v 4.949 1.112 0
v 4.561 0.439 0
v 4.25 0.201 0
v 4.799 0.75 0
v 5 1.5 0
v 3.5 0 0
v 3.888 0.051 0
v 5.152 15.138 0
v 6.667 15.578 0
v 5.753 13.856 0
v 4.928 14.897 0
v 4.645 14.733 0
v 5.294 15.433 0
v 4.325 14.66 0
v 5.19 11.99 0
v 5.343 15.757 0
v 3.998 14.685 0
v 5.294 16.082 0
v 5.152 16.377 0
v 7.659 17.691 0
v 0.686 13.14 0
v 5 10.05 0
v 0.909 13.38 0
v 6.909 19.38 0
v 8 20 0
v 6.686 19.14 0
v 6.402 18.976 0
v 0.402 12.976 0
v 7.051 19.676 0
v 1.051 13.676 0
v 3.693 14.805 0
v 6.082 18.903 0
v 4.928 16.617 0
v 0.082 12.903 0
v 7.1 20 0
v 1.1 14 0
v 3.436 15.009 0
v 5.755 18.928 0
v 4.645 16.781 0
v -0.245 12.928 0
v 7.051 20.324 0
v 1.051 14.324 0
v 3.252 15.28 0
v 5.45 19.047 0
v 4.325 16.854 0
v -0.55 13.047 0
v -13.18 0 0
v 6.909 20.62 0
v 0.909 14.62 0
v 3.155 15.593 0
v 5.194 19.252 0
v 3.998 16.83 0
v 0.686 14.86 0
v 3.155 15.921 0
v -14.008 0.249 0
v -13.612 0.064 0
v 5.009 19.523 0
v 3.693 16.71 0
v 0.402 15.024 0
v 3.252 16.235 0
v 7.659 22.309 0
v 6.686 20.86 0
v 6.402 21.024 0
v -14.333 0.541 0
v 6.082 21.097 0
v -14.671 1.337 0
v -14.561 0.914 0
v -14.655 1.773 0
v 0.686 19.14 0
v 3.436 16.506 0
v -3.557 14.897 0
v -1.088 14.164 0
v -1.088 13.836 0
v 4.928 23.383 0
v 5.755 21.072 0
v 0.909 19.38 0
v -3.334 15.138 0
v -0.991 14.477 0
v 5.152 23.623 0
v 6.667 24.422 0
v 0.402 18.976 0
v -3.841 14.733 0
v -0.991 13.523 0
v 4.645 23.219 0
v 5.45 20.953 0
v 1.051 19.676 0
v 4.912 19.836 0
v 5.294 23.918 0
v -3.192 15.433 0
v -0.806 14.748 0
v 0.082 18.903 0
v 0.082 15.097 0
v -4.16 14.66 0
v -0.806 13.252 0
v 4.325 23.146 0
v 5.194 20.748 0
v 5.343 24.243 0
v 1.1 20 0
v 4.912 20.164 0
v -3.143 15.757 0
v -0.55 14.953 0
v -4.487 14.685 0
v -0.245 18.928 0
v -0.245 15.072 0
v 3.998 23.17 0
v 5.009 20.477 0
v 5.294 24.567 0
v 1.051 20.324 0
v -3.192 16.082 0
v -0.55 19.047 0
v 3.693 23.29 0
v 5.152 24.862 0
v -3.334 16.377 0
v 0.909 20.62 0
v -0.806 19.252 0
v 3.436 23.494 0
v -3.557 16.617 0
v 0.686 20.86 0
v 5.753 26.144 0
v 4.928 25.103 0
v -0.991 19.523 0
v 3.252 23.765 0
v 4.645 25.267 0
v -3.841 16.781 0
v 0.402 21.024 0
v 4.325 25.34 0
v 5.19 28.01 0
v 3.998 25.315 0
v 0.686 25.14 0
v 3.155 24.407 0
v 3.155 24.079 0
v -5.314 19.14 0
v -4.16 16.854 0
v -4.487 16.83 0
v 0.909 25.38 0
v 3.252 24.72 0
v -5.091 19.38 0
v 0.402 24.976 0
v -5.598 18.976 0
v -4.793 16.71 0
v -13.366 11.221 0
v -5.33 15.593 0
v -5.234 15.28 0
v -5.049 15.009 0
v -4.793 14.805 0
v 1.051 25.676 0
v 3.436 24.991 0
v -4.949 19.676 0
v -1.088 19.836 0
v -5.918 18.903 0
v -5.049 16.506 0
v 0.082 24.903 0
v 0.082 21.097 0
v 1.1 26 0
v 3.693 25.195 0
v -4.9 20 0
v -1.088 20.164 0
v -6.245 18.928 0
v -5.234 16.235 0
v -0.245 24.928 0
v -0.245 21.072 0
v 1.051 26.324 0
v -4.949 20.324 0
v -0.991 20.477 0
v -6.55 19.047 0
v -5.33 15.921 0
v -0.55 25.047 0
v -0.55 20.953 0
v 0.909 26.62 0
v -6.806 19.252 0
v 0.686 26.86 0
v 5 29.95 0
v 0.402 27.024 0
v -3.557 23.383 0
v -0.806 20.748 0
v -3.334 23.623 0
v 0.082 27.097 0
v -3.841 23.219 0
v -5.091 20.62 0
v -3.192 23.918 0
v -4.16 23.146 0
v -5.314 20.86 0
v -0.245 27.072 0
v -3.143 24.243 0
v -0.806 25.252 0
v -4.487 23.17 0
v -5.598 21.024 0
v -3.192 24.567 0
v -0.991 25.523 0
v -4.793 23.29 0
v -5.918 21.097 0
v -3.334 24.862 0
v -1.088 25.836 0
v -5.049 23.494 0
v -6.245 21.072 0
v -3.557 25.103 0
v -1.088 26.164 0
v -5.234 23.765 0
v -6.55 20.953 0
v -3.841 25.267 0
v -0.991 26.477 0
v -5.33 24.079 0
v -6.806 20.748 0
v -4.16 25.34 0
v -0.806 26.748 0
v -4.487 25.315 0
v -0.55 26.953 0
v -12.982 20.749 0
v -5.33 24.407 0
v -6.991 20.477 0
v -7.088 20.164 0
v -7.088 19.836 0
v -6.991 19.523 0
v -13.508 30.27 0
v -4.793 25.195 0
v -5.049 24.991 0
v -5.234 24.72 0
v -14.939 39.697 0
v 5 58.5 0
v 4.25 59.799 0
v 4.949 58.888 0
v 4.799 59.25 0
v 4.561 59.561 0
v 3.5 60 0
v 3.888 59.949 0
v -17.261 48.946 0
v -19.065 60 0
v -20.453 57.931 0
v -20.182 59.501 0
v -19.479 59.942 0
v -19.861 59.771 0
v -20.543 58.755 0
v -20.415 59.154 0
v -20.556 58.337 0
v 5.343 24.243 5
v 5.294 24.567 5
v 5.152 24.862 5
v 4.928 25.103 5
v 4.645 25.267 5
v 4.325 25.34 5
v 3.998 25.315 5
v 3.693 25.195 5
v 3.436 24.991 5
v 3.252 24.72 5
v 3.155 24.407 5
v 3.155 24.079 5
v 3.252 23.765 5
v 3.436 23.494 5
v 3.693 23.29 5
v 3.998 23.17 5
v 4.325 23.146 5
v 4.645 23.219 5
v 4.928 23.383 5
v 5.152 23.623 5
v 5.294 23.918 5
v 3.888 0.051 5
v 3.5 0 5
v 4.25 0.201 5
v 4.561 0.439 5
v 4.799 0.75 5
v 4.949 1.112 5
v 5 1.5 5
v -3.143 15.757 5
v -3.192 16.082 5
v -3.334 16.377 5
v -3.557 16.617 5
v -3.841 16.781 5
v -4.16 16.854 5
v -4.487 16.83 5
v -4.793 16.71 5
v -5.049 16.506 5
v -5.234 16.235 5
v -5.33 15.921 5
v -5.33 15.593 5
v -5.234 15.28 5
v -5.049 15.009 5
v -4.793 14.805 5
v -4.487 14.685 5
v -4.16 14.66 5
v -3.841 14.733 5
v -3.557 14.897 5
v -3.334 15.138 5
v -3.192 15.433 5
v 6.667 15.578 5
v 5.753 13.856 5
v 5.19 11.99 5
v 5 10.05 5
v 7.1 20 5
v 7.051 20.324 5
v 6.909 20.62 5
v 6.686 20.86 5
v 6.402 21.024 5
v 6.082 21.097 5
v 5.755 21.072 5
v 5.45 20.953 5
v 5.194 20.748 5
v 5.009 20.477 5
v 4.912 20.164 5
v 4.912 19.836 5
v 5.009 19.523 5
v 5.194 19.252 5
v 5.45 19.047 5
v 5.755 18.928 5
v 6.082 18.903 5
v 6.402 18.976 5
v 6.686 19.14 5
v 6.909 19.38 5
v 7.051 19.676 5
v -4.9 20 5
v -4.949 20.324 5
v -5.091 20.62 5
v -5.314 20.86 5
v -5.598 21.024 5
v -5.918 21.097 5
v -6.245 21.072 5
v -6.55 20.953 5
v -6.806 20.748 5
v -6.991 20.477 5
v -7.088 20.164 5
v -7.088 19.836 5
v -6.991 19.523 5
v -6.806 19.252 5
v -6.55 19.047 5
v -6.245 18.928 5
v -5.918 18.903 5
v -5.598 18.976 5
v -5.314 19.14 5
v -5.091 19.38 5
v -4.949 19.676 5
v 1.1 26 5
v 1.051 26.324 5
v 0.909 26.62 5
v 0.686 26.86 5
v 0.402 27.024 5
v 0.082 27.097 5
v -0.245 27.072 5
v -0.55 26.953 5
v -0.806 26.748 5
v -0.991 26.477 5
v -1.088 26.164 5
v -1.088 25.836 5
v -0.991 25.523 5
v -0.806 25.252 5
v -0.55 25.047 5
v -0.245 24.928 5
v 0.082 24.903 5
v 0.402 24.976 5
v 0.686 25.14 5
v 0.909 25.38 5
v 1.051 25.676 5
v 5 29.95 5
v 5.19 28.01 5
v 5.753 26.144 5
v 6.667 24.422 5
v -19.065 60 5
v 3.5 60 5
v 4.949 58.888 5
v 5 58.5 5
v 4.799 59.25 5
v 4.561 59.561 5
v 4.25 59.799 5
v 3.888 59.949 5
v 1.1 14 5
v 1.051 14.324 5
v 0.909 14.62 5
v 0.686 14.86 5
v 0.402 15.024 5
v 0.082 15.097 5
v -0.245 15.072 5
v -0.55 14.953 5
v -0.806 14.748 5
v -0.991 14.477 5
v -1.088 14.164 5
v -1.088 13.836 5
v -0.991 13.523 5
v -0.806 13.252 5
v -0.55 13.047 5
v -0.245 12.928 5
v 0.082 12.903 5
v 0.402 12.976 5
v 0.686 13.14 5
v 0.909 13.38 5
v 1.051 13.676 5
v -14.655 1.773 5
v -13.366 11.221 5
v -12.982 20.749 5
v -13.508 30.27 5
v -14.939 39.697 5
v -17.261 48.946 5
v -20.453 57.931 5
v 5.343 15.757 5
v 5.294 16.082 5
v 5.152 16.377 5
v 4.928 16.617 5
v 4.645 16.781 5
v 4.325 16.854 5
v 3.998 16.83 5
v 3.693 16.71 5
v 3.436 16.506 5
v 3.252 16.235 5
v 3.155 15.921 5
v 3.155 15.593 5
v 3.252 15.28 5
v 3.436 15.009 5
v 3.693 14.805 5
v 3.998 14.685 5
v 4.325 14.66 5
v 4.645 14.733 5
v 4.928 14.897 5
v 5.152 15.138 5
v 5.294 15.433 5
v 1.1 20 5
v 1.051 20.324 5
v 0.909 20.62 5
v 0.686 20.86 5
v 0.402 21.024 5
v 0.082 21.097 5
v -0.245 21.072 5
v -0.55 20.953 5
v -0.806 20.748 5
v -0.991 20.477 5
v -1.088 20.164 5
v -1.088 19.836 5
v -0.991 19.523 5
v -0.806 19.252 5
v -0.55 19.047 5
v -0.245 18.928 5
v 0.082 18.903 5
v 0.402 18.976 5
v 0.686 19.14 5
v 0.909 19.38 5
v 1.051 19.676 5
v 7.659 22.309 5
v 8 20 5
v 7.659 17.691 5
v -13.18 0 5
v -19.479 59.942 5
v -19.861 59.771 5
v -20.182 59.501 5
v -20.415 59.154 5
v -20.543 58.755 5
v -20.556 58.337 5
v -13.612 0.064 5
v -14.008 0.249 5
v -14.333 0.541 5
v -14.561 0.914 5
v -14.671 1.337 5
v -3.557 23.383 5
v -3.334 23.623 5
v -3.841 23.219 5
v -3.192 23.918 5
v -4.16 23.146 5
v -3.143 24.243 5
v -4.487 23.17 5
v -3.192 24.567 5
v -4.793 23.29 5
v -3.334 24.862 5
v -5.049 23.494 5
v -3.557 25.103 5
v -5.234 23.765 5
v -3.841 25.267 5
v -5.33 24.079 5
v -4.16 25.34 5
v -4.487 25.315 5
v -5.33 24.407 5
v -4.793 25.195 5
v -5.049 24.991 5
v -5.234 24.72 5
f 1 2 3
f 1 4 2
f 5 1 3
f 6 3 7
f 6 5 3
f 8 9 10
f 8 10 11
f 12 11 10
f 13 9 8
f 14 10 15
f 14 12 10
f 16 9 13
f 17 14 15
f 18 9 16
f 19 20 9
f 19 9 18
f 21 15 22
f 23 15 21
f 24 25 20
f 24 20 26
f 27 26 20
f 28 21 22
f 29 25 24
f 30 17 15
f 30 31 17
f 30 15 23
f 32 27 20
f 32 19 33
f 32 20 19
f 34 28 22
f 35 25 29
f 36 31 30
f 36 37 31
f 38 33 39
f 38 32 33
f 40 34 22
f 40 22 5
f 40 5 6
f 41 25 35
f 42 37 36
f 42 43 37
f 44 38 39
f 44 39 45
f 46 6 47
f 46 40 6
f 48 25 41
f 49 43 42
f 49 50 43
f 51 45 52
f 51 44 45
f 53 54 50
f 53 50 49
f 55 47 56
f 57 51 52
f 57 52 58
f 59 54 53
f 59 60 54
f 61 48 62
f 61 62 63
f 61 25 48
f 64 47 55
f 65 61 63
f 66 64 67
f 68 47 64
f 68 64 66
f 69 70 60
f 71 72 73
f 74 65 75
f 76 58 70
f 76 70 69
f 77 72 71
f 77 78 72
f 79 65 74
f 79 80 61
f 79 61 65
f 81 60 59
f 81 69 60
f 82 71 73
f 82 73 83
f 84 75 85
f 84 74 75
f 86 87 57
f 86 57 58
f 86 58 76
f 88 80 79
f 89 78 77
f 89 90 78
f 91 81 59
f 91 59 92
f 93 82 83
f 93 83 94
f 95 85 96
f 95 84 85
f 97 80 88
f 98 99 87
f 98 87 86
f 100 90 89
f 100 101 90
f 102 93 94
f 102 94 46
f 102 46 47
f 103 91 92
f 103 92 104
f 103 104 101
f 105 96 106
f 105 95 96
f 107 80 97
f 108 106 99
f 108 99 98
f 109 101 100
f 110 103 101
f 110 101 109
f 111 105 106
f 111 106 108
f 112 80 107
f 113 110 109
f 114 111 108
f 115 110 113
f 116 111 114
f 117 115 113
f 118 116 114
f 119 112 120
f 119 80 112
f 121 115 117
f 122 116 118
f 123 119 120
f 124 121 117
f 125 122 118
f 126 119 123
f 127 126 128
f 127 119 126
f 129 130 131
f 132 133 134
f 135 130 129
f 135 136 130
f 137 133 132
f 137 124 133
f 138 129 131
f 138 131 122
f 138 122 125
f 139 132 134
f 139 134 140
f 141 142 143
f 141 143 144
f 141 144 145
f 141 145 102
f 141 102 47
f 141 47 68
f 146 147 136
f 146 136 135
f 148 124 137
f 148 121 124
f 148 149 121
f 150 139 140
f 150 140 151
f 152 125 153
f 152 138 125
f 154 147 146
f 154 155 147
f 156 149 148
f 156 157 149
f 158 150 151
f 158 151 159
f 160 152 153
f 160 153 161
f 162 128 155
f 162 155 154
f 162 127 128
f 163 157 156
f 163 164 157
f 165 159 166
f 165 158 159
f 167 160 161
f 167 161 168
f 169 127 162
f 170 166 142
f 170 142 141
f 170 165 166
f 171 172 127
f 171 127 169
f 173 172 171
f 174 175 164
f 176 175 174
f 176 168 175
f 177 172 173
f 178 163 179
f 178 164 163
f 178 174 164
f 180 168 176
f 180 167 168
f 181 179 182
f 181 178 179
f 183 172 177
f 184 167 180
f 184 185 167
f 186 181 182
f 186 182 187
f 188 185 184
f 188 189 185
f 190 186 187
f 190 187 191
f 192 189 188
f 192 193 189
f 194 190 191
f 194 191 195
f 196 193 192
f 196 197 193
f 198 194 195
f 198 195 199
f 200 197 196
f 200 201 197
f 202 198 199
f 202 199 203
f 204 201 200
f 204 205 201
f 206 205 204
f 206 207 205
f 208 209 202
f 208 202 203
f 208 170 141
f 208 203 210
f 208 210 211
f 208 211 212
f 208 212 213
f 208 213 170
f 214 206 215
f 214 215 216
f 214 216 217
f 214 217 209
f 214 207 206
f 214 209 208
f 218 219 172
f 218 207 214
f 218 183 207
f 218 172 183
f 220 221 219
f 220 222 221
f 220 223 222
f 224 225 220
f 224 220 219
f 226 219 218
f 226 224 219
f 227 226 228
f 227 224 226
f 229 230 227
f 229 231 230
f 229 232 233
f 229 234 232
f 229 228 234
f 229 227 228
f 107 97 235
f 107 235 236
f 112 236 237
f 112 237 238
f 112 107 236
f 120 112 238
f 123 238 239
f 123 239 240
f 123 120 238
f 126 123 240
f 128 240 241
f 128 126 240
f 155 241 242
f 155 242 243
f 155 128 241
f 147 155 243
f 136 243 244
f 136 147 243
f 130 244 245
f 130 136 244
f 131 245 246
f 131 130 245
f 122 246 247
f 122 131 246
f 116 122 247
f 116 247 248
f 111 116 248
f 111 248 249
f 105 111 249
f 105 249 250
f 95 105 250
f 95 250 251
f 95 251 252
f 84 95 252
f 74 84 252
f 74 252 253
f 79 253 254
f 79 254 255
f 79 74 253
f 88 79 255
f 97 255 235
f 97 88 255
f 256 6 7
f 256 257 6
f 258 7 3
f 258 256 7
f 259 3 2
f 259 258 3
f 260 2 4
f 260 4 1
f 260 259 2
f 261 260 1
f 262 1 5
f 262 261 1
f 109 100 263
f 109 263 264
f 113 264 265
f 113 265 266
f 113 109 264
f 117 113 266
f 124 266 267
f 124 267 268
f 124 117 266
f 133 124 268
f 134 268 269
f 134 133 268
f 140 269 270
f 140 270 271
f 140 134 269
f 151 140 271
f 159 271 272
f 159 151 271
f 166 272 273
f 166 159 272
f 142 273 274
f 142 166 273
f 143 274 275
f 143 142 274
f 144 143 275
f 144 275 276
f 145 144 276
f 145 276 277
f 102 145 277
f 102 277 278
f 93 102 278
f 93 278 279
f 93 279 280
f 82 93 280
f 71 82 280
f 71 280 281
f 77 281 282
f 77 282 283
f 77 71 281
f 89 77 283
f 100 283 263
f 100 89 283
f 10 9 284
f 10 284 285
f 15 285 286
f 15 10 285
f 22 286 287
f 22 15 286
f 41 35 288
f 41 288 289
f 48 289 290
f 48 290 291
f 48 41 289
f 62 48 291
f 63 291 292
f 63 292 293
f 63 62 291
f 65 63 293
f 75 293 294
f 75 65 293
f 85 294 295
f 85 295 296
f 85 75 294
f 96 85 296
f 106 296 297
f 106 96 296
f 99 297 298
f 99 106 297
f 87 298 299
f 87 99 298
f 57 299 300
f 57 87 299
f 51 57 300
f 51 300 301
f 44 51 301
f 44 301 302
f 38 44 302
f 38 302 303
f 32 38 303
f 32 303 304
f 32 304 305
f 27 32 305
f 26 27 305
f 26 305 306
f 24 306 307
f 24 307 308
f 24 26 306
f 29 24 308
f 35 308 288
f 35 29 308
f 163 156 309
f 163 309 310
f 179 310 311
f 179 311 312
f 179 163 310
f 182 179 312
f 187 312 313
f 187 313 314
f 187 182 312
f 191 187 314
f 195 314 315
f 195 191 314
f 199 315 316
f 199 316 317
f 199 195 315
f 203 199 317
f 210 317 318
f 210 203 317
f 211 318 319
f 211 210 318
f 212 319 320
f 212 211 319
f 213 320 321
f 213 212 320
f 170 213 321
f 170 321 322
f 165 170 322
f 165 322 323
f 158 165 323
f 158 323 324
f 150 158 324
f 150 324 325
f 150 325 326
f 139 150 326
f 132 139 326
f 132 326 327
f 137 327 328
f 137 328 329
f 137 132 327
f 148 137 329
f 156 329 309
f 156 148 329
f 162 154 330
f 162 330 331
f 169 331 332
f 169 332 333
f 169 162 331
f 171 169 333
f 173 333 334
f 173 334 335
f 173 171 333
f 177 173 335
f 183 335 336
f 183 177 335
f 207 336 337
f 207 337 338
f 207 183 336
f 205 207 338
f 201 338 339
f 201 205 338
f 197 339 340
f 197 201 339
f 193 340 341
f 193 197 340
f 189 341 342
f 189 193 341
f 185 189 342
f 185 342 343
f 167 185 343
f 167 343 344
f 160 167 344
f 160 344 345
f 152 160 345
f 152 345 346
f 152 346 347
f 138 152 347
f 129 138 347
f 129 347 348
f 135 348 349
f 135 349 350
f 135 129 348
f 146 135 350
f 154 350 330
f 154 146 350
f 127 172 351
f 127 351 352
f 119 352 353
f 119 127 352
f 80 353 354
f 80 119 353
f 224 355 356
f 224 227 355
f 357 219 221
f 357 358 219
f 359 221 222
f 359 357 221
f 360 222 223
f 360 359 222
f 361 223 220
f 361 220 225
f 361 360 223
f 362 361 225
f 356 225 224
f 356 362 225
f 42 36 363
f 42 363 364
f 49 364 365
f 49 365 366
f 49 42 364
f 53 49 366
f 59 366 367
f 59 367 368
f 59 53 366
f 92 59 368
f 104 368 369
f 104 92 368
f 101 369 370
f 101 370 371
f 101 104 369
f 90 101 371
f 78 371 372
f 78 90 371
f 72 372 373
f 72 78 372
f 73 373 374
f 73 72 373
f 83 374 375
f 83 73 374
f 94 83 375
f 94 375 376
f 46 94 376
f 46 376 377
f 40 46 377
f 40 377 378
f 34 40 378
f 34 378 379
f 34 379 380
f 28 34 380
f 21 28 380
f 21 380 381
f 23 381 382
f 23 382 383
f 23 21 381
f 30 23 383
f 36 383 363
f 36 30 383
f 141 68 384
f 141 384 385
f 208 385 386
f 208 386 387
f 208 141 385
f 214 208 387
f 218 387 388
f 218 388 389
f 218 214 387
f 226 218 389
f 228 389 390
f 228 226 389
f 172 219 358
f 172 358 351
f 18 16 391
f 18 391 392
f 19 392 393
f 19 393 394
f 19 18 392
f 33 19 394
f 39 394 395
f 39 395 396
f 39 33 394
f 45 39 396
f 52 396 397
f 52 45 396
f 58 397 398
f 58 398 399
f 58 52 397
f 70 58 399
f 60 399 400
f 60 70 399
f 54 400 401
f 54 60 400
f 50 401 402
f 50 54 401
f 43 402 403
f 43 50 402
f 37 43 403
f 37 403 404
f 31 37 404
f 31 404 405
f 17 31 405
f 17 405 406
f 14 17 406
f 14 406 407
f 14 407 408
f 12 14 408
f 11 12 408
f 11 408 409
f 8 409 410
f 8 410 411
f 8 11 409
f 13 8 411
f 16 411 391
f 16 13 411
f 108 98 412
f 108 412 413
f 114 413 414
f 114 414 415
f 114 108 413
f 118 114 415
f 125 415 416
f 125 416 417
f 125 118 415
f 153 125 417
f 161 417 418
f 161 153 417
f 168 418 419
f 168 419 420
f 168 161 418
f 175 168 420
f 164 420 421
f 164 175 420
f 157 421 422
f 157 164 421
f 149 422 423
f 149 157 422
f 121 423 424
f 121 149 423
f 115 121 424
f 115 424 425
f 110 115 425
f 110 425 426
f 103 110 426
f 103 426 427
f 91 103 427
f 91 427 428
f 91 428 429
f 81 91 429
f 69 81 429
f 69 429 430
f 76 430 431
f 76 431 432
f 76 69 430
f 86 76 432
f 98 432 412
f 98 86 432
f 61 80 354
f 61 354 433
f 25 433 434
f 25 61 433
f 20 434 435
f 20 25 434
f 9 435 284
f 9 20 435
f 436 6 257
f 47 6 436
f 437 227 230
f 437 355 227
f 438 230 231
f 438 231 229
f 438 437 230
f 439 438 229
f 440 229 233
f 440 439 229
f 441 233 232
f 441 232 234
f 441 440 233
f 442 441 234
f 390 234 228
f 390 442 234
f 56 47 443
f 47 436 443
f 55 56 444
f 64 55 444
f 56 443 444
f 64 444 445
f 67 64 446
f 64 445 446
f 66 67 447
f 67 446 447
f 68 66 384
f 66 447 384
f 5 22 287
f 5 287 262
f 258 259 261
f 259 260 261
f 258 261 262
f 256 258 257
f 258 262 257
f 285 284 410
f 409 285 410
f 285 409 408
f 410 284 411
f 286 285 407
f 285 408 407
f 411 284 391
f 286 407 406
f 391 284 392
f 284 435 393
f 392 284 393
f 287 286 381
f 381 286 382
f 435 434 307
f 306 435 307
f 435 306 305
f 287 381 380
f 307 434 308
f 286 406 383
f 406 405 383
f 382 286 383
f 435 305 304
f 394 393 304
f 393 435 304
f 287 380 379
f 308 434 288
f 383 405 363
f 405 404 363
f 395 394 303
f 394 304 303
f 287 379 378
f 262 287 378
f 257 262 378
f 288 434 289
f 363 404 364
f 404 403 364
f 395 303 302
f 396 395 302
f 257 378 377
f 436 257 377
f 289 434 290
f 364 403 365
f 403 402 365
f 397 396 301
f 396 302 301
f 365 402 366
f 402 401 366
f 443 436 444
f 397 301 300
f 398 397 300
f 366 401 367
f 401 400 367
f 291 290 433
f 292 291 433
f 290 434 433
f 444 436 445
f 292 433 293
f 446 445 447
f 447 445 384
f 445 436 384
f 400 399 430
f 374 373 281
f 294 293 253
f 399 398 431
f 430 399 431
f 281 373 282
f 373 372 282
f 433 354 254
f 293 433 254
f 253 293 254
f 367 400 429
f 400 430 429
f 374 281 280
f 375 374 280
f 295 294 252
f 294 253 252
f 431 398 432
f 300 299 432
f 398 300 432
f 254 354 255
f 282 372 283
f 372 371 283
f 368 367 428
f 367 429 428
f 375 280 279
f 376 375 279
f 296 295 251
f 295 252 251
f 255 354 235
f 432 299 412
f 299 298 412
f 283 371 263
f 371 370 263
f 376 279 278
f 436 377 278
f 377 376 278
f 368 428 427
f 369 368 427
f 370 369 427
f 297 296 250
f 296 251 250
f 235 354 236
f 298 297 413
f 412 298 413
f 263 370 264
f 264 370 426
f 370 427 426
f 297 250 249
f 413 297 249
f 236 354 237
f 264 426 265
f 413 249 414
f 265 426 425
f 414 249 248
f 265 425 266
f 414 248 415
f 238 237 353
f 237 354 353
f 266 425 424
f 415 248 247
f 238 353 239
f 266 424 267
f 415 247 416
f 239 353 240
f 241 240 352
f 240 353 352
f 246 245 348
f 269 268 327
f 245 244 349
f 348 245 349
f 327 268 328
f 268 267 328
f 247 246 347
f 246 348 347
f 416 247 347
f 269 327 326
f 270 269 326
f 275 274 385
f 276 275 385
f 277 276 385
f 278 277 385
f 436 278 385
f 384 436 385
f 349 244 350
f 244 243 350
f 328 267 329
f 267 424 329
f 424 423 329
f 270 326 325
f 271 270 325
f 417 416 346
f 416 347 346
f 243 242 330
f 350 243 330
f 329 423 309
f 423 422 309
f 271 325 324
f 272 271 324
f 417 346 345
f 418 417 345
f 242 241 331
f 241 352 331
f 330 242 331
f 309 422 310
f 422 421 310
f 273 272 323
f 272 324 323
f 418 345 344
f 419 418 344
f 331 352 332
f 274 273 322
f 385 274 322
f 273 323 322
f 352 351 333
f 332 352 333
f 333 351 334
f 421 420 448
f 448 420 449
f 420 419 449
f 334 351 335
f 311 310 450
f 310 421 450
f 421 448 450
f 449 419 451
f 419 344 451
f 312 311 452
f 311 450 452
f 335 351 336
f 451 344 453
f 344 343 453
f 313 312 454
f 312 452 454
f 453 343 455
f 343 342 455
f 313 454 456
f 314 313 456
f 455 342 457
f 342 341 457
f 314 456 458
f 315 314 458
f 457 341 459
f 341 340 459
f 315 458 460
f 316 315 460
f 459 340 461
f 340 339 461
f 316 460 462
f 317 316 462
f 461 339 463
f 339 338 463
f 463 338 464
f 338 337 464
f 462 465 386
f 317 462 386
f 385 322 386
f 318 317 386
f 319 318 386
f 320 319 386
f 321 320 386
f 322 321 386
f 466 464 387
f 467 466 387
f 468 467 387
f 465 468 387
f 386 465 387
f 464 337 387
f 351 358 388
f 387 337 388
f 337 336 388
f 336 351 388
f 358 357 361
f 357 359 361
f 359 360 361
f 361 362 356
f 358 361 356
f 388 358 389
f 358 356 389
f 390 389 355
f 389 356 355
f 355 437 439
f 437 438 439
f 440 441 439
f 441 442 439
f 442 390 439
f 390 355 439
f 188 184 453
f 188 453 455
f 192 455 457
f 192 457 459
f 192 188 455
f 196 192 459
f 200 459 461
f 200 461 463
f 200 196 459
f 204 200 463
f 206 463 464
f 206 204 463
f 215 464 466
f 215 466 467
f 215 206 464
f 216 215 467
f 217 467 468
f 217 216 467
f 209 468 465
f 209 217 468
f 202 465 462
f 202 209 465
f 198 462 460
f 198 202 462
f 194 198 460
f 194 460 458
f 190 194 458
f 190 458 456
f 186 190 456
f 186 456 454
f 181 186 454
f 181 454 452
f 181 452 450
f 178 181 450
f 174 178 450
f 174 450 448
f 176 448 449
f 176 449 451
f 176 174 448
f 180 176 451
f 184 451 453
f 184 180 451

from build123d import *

# Parameters (mm, degrees)
SKETCH_1_R      = 1.1
EXTRUDE_1_DEPTH = 5
EXTRUDE_2_DEPTH = 5
FILLET_1_R      = 1.5


with BuildPart() as part:
    # ｽｹｯﾁ1 → ﾎﾞｽ - 押し出し1 (new body)
    with BuildSketch(Plane.XY):
        with BuildLine():
            Line((-5, 60), (5, 60))
            Line((5, 60), (5, 29.949874371))
            ThreePointArc((5, 29.949874371), (5.425728922, 27.063123025), (6.666666667, 24.422166387))
            ThreePointArc((6.666666667, 24.422166387), (8, 20), (6.666666667, 15.577833613))
            ThreePointArc((6.666666667, 15.577833613), (5.425728922, 12.936876975), (5, 10.050125629))
            Line((5, 10.050125629), (5, 0))
            Line((5, 0), (-5, 0))
            Line((-5, 0), (-5, 10.050125629))
            ThreePointArc((-5, 10.050125629), (-5.425728922, 12.936876975), (-6.666666667, 15.577833613))
            ThreePointArc((-6.666666667, 15.577833613), (-8, 20), (-6.666666667, 24.422166387))
            ThreePointArc((-6.666666667, 24.422166387), (-5.425728922, 27.063123025), (-5, 29.949874371))
            Line((-5, 29.949874371), (-5, 60))
        make_face()
        with Locations((0, 20)):
            Circle(SKETCH_1_R, mode=Mode.SUBTRACT)
        with Locations((0, 14)):
            Circle(SKETCH_1_R, mode=Mode.SUBTRACT)
        with Locations((-4.242640687, 15.757359313)):
            Circle(SKETCH_1_R, mode=Mode.SUBTRACT)
        with Locations((-6, 20)):
            Circle(SKETCH_1_R, mode=Mode.SUBTRACT)
        with Locations((-4.242640687, 24.242640687)):
            Circle(SKETCH_1_R, mode=Mode.SUBTRACT)
        with Locations((0, 26)):
            Circle(SKETCH_1_R, mode=Mode.SUBTRACT)
        with Locations((4.242640687, 24.242640687)):
            Circle(SKETCH_1_R, mode=Mode.SUBTRACT)
        with Locations((6, 20)):
            Circle(SKETCH_1_R, mode=Mode.SUBTRACT)
        with Locations((4.242640687, 15.757359313)):
            Circle(SKETCH_1_R, mode=Mode.SUBTRACT)
    extrude(amount=EXTRUDE_1_DEPTH)

    # ｽｹｯﾁ2 → ﾎﾞｽ - 押し出し2 (add)
    with BuildSketch(Plane(origin=(0, 0, 0), x_dir=(-1, 0, 0), z_dir=(0, 0, -1))):
        with BuildLine():
            Line((5, 10.050125629), (5, 0))
            Line((5, 0), (15, 0))
            ThreePointArc((15, 0), (13.531166576, 30.48861935), (21.328075812, 60))
            Line((21.328075812, 60), (5, 60))
            Line((5, 60), (5, 29.949874371))
            ThreePointArc((5, 29.949874371), (5.425728922, 27.063123025), (6.666666667, 24.422166387))
            ThreePointArc((6.666666667, 24.422166387), (8, 20), (6.666666667, 15.577833613))
            ThreePointArc((6.666666667, 15.577833613), (5.425728922, 12.936876975), (5, 10.050125629))
        make_face()
    extrude(amount=-EXTRUDE_2_DEPTH)

    # ﾌｨﾚｯﾄ1
    fillet_1_edges = [part.edges().sort_by_distance(p)[0] for p in [
        (5, 0, 2.5),
        (5, 60, 2.5),
        (-21.328075812, 60, 2.5),
        (-15, 0, 2.5),
    ]]
    fillet(fillet_1_edges, radius=FILLET_1_R)


solid = part.part
